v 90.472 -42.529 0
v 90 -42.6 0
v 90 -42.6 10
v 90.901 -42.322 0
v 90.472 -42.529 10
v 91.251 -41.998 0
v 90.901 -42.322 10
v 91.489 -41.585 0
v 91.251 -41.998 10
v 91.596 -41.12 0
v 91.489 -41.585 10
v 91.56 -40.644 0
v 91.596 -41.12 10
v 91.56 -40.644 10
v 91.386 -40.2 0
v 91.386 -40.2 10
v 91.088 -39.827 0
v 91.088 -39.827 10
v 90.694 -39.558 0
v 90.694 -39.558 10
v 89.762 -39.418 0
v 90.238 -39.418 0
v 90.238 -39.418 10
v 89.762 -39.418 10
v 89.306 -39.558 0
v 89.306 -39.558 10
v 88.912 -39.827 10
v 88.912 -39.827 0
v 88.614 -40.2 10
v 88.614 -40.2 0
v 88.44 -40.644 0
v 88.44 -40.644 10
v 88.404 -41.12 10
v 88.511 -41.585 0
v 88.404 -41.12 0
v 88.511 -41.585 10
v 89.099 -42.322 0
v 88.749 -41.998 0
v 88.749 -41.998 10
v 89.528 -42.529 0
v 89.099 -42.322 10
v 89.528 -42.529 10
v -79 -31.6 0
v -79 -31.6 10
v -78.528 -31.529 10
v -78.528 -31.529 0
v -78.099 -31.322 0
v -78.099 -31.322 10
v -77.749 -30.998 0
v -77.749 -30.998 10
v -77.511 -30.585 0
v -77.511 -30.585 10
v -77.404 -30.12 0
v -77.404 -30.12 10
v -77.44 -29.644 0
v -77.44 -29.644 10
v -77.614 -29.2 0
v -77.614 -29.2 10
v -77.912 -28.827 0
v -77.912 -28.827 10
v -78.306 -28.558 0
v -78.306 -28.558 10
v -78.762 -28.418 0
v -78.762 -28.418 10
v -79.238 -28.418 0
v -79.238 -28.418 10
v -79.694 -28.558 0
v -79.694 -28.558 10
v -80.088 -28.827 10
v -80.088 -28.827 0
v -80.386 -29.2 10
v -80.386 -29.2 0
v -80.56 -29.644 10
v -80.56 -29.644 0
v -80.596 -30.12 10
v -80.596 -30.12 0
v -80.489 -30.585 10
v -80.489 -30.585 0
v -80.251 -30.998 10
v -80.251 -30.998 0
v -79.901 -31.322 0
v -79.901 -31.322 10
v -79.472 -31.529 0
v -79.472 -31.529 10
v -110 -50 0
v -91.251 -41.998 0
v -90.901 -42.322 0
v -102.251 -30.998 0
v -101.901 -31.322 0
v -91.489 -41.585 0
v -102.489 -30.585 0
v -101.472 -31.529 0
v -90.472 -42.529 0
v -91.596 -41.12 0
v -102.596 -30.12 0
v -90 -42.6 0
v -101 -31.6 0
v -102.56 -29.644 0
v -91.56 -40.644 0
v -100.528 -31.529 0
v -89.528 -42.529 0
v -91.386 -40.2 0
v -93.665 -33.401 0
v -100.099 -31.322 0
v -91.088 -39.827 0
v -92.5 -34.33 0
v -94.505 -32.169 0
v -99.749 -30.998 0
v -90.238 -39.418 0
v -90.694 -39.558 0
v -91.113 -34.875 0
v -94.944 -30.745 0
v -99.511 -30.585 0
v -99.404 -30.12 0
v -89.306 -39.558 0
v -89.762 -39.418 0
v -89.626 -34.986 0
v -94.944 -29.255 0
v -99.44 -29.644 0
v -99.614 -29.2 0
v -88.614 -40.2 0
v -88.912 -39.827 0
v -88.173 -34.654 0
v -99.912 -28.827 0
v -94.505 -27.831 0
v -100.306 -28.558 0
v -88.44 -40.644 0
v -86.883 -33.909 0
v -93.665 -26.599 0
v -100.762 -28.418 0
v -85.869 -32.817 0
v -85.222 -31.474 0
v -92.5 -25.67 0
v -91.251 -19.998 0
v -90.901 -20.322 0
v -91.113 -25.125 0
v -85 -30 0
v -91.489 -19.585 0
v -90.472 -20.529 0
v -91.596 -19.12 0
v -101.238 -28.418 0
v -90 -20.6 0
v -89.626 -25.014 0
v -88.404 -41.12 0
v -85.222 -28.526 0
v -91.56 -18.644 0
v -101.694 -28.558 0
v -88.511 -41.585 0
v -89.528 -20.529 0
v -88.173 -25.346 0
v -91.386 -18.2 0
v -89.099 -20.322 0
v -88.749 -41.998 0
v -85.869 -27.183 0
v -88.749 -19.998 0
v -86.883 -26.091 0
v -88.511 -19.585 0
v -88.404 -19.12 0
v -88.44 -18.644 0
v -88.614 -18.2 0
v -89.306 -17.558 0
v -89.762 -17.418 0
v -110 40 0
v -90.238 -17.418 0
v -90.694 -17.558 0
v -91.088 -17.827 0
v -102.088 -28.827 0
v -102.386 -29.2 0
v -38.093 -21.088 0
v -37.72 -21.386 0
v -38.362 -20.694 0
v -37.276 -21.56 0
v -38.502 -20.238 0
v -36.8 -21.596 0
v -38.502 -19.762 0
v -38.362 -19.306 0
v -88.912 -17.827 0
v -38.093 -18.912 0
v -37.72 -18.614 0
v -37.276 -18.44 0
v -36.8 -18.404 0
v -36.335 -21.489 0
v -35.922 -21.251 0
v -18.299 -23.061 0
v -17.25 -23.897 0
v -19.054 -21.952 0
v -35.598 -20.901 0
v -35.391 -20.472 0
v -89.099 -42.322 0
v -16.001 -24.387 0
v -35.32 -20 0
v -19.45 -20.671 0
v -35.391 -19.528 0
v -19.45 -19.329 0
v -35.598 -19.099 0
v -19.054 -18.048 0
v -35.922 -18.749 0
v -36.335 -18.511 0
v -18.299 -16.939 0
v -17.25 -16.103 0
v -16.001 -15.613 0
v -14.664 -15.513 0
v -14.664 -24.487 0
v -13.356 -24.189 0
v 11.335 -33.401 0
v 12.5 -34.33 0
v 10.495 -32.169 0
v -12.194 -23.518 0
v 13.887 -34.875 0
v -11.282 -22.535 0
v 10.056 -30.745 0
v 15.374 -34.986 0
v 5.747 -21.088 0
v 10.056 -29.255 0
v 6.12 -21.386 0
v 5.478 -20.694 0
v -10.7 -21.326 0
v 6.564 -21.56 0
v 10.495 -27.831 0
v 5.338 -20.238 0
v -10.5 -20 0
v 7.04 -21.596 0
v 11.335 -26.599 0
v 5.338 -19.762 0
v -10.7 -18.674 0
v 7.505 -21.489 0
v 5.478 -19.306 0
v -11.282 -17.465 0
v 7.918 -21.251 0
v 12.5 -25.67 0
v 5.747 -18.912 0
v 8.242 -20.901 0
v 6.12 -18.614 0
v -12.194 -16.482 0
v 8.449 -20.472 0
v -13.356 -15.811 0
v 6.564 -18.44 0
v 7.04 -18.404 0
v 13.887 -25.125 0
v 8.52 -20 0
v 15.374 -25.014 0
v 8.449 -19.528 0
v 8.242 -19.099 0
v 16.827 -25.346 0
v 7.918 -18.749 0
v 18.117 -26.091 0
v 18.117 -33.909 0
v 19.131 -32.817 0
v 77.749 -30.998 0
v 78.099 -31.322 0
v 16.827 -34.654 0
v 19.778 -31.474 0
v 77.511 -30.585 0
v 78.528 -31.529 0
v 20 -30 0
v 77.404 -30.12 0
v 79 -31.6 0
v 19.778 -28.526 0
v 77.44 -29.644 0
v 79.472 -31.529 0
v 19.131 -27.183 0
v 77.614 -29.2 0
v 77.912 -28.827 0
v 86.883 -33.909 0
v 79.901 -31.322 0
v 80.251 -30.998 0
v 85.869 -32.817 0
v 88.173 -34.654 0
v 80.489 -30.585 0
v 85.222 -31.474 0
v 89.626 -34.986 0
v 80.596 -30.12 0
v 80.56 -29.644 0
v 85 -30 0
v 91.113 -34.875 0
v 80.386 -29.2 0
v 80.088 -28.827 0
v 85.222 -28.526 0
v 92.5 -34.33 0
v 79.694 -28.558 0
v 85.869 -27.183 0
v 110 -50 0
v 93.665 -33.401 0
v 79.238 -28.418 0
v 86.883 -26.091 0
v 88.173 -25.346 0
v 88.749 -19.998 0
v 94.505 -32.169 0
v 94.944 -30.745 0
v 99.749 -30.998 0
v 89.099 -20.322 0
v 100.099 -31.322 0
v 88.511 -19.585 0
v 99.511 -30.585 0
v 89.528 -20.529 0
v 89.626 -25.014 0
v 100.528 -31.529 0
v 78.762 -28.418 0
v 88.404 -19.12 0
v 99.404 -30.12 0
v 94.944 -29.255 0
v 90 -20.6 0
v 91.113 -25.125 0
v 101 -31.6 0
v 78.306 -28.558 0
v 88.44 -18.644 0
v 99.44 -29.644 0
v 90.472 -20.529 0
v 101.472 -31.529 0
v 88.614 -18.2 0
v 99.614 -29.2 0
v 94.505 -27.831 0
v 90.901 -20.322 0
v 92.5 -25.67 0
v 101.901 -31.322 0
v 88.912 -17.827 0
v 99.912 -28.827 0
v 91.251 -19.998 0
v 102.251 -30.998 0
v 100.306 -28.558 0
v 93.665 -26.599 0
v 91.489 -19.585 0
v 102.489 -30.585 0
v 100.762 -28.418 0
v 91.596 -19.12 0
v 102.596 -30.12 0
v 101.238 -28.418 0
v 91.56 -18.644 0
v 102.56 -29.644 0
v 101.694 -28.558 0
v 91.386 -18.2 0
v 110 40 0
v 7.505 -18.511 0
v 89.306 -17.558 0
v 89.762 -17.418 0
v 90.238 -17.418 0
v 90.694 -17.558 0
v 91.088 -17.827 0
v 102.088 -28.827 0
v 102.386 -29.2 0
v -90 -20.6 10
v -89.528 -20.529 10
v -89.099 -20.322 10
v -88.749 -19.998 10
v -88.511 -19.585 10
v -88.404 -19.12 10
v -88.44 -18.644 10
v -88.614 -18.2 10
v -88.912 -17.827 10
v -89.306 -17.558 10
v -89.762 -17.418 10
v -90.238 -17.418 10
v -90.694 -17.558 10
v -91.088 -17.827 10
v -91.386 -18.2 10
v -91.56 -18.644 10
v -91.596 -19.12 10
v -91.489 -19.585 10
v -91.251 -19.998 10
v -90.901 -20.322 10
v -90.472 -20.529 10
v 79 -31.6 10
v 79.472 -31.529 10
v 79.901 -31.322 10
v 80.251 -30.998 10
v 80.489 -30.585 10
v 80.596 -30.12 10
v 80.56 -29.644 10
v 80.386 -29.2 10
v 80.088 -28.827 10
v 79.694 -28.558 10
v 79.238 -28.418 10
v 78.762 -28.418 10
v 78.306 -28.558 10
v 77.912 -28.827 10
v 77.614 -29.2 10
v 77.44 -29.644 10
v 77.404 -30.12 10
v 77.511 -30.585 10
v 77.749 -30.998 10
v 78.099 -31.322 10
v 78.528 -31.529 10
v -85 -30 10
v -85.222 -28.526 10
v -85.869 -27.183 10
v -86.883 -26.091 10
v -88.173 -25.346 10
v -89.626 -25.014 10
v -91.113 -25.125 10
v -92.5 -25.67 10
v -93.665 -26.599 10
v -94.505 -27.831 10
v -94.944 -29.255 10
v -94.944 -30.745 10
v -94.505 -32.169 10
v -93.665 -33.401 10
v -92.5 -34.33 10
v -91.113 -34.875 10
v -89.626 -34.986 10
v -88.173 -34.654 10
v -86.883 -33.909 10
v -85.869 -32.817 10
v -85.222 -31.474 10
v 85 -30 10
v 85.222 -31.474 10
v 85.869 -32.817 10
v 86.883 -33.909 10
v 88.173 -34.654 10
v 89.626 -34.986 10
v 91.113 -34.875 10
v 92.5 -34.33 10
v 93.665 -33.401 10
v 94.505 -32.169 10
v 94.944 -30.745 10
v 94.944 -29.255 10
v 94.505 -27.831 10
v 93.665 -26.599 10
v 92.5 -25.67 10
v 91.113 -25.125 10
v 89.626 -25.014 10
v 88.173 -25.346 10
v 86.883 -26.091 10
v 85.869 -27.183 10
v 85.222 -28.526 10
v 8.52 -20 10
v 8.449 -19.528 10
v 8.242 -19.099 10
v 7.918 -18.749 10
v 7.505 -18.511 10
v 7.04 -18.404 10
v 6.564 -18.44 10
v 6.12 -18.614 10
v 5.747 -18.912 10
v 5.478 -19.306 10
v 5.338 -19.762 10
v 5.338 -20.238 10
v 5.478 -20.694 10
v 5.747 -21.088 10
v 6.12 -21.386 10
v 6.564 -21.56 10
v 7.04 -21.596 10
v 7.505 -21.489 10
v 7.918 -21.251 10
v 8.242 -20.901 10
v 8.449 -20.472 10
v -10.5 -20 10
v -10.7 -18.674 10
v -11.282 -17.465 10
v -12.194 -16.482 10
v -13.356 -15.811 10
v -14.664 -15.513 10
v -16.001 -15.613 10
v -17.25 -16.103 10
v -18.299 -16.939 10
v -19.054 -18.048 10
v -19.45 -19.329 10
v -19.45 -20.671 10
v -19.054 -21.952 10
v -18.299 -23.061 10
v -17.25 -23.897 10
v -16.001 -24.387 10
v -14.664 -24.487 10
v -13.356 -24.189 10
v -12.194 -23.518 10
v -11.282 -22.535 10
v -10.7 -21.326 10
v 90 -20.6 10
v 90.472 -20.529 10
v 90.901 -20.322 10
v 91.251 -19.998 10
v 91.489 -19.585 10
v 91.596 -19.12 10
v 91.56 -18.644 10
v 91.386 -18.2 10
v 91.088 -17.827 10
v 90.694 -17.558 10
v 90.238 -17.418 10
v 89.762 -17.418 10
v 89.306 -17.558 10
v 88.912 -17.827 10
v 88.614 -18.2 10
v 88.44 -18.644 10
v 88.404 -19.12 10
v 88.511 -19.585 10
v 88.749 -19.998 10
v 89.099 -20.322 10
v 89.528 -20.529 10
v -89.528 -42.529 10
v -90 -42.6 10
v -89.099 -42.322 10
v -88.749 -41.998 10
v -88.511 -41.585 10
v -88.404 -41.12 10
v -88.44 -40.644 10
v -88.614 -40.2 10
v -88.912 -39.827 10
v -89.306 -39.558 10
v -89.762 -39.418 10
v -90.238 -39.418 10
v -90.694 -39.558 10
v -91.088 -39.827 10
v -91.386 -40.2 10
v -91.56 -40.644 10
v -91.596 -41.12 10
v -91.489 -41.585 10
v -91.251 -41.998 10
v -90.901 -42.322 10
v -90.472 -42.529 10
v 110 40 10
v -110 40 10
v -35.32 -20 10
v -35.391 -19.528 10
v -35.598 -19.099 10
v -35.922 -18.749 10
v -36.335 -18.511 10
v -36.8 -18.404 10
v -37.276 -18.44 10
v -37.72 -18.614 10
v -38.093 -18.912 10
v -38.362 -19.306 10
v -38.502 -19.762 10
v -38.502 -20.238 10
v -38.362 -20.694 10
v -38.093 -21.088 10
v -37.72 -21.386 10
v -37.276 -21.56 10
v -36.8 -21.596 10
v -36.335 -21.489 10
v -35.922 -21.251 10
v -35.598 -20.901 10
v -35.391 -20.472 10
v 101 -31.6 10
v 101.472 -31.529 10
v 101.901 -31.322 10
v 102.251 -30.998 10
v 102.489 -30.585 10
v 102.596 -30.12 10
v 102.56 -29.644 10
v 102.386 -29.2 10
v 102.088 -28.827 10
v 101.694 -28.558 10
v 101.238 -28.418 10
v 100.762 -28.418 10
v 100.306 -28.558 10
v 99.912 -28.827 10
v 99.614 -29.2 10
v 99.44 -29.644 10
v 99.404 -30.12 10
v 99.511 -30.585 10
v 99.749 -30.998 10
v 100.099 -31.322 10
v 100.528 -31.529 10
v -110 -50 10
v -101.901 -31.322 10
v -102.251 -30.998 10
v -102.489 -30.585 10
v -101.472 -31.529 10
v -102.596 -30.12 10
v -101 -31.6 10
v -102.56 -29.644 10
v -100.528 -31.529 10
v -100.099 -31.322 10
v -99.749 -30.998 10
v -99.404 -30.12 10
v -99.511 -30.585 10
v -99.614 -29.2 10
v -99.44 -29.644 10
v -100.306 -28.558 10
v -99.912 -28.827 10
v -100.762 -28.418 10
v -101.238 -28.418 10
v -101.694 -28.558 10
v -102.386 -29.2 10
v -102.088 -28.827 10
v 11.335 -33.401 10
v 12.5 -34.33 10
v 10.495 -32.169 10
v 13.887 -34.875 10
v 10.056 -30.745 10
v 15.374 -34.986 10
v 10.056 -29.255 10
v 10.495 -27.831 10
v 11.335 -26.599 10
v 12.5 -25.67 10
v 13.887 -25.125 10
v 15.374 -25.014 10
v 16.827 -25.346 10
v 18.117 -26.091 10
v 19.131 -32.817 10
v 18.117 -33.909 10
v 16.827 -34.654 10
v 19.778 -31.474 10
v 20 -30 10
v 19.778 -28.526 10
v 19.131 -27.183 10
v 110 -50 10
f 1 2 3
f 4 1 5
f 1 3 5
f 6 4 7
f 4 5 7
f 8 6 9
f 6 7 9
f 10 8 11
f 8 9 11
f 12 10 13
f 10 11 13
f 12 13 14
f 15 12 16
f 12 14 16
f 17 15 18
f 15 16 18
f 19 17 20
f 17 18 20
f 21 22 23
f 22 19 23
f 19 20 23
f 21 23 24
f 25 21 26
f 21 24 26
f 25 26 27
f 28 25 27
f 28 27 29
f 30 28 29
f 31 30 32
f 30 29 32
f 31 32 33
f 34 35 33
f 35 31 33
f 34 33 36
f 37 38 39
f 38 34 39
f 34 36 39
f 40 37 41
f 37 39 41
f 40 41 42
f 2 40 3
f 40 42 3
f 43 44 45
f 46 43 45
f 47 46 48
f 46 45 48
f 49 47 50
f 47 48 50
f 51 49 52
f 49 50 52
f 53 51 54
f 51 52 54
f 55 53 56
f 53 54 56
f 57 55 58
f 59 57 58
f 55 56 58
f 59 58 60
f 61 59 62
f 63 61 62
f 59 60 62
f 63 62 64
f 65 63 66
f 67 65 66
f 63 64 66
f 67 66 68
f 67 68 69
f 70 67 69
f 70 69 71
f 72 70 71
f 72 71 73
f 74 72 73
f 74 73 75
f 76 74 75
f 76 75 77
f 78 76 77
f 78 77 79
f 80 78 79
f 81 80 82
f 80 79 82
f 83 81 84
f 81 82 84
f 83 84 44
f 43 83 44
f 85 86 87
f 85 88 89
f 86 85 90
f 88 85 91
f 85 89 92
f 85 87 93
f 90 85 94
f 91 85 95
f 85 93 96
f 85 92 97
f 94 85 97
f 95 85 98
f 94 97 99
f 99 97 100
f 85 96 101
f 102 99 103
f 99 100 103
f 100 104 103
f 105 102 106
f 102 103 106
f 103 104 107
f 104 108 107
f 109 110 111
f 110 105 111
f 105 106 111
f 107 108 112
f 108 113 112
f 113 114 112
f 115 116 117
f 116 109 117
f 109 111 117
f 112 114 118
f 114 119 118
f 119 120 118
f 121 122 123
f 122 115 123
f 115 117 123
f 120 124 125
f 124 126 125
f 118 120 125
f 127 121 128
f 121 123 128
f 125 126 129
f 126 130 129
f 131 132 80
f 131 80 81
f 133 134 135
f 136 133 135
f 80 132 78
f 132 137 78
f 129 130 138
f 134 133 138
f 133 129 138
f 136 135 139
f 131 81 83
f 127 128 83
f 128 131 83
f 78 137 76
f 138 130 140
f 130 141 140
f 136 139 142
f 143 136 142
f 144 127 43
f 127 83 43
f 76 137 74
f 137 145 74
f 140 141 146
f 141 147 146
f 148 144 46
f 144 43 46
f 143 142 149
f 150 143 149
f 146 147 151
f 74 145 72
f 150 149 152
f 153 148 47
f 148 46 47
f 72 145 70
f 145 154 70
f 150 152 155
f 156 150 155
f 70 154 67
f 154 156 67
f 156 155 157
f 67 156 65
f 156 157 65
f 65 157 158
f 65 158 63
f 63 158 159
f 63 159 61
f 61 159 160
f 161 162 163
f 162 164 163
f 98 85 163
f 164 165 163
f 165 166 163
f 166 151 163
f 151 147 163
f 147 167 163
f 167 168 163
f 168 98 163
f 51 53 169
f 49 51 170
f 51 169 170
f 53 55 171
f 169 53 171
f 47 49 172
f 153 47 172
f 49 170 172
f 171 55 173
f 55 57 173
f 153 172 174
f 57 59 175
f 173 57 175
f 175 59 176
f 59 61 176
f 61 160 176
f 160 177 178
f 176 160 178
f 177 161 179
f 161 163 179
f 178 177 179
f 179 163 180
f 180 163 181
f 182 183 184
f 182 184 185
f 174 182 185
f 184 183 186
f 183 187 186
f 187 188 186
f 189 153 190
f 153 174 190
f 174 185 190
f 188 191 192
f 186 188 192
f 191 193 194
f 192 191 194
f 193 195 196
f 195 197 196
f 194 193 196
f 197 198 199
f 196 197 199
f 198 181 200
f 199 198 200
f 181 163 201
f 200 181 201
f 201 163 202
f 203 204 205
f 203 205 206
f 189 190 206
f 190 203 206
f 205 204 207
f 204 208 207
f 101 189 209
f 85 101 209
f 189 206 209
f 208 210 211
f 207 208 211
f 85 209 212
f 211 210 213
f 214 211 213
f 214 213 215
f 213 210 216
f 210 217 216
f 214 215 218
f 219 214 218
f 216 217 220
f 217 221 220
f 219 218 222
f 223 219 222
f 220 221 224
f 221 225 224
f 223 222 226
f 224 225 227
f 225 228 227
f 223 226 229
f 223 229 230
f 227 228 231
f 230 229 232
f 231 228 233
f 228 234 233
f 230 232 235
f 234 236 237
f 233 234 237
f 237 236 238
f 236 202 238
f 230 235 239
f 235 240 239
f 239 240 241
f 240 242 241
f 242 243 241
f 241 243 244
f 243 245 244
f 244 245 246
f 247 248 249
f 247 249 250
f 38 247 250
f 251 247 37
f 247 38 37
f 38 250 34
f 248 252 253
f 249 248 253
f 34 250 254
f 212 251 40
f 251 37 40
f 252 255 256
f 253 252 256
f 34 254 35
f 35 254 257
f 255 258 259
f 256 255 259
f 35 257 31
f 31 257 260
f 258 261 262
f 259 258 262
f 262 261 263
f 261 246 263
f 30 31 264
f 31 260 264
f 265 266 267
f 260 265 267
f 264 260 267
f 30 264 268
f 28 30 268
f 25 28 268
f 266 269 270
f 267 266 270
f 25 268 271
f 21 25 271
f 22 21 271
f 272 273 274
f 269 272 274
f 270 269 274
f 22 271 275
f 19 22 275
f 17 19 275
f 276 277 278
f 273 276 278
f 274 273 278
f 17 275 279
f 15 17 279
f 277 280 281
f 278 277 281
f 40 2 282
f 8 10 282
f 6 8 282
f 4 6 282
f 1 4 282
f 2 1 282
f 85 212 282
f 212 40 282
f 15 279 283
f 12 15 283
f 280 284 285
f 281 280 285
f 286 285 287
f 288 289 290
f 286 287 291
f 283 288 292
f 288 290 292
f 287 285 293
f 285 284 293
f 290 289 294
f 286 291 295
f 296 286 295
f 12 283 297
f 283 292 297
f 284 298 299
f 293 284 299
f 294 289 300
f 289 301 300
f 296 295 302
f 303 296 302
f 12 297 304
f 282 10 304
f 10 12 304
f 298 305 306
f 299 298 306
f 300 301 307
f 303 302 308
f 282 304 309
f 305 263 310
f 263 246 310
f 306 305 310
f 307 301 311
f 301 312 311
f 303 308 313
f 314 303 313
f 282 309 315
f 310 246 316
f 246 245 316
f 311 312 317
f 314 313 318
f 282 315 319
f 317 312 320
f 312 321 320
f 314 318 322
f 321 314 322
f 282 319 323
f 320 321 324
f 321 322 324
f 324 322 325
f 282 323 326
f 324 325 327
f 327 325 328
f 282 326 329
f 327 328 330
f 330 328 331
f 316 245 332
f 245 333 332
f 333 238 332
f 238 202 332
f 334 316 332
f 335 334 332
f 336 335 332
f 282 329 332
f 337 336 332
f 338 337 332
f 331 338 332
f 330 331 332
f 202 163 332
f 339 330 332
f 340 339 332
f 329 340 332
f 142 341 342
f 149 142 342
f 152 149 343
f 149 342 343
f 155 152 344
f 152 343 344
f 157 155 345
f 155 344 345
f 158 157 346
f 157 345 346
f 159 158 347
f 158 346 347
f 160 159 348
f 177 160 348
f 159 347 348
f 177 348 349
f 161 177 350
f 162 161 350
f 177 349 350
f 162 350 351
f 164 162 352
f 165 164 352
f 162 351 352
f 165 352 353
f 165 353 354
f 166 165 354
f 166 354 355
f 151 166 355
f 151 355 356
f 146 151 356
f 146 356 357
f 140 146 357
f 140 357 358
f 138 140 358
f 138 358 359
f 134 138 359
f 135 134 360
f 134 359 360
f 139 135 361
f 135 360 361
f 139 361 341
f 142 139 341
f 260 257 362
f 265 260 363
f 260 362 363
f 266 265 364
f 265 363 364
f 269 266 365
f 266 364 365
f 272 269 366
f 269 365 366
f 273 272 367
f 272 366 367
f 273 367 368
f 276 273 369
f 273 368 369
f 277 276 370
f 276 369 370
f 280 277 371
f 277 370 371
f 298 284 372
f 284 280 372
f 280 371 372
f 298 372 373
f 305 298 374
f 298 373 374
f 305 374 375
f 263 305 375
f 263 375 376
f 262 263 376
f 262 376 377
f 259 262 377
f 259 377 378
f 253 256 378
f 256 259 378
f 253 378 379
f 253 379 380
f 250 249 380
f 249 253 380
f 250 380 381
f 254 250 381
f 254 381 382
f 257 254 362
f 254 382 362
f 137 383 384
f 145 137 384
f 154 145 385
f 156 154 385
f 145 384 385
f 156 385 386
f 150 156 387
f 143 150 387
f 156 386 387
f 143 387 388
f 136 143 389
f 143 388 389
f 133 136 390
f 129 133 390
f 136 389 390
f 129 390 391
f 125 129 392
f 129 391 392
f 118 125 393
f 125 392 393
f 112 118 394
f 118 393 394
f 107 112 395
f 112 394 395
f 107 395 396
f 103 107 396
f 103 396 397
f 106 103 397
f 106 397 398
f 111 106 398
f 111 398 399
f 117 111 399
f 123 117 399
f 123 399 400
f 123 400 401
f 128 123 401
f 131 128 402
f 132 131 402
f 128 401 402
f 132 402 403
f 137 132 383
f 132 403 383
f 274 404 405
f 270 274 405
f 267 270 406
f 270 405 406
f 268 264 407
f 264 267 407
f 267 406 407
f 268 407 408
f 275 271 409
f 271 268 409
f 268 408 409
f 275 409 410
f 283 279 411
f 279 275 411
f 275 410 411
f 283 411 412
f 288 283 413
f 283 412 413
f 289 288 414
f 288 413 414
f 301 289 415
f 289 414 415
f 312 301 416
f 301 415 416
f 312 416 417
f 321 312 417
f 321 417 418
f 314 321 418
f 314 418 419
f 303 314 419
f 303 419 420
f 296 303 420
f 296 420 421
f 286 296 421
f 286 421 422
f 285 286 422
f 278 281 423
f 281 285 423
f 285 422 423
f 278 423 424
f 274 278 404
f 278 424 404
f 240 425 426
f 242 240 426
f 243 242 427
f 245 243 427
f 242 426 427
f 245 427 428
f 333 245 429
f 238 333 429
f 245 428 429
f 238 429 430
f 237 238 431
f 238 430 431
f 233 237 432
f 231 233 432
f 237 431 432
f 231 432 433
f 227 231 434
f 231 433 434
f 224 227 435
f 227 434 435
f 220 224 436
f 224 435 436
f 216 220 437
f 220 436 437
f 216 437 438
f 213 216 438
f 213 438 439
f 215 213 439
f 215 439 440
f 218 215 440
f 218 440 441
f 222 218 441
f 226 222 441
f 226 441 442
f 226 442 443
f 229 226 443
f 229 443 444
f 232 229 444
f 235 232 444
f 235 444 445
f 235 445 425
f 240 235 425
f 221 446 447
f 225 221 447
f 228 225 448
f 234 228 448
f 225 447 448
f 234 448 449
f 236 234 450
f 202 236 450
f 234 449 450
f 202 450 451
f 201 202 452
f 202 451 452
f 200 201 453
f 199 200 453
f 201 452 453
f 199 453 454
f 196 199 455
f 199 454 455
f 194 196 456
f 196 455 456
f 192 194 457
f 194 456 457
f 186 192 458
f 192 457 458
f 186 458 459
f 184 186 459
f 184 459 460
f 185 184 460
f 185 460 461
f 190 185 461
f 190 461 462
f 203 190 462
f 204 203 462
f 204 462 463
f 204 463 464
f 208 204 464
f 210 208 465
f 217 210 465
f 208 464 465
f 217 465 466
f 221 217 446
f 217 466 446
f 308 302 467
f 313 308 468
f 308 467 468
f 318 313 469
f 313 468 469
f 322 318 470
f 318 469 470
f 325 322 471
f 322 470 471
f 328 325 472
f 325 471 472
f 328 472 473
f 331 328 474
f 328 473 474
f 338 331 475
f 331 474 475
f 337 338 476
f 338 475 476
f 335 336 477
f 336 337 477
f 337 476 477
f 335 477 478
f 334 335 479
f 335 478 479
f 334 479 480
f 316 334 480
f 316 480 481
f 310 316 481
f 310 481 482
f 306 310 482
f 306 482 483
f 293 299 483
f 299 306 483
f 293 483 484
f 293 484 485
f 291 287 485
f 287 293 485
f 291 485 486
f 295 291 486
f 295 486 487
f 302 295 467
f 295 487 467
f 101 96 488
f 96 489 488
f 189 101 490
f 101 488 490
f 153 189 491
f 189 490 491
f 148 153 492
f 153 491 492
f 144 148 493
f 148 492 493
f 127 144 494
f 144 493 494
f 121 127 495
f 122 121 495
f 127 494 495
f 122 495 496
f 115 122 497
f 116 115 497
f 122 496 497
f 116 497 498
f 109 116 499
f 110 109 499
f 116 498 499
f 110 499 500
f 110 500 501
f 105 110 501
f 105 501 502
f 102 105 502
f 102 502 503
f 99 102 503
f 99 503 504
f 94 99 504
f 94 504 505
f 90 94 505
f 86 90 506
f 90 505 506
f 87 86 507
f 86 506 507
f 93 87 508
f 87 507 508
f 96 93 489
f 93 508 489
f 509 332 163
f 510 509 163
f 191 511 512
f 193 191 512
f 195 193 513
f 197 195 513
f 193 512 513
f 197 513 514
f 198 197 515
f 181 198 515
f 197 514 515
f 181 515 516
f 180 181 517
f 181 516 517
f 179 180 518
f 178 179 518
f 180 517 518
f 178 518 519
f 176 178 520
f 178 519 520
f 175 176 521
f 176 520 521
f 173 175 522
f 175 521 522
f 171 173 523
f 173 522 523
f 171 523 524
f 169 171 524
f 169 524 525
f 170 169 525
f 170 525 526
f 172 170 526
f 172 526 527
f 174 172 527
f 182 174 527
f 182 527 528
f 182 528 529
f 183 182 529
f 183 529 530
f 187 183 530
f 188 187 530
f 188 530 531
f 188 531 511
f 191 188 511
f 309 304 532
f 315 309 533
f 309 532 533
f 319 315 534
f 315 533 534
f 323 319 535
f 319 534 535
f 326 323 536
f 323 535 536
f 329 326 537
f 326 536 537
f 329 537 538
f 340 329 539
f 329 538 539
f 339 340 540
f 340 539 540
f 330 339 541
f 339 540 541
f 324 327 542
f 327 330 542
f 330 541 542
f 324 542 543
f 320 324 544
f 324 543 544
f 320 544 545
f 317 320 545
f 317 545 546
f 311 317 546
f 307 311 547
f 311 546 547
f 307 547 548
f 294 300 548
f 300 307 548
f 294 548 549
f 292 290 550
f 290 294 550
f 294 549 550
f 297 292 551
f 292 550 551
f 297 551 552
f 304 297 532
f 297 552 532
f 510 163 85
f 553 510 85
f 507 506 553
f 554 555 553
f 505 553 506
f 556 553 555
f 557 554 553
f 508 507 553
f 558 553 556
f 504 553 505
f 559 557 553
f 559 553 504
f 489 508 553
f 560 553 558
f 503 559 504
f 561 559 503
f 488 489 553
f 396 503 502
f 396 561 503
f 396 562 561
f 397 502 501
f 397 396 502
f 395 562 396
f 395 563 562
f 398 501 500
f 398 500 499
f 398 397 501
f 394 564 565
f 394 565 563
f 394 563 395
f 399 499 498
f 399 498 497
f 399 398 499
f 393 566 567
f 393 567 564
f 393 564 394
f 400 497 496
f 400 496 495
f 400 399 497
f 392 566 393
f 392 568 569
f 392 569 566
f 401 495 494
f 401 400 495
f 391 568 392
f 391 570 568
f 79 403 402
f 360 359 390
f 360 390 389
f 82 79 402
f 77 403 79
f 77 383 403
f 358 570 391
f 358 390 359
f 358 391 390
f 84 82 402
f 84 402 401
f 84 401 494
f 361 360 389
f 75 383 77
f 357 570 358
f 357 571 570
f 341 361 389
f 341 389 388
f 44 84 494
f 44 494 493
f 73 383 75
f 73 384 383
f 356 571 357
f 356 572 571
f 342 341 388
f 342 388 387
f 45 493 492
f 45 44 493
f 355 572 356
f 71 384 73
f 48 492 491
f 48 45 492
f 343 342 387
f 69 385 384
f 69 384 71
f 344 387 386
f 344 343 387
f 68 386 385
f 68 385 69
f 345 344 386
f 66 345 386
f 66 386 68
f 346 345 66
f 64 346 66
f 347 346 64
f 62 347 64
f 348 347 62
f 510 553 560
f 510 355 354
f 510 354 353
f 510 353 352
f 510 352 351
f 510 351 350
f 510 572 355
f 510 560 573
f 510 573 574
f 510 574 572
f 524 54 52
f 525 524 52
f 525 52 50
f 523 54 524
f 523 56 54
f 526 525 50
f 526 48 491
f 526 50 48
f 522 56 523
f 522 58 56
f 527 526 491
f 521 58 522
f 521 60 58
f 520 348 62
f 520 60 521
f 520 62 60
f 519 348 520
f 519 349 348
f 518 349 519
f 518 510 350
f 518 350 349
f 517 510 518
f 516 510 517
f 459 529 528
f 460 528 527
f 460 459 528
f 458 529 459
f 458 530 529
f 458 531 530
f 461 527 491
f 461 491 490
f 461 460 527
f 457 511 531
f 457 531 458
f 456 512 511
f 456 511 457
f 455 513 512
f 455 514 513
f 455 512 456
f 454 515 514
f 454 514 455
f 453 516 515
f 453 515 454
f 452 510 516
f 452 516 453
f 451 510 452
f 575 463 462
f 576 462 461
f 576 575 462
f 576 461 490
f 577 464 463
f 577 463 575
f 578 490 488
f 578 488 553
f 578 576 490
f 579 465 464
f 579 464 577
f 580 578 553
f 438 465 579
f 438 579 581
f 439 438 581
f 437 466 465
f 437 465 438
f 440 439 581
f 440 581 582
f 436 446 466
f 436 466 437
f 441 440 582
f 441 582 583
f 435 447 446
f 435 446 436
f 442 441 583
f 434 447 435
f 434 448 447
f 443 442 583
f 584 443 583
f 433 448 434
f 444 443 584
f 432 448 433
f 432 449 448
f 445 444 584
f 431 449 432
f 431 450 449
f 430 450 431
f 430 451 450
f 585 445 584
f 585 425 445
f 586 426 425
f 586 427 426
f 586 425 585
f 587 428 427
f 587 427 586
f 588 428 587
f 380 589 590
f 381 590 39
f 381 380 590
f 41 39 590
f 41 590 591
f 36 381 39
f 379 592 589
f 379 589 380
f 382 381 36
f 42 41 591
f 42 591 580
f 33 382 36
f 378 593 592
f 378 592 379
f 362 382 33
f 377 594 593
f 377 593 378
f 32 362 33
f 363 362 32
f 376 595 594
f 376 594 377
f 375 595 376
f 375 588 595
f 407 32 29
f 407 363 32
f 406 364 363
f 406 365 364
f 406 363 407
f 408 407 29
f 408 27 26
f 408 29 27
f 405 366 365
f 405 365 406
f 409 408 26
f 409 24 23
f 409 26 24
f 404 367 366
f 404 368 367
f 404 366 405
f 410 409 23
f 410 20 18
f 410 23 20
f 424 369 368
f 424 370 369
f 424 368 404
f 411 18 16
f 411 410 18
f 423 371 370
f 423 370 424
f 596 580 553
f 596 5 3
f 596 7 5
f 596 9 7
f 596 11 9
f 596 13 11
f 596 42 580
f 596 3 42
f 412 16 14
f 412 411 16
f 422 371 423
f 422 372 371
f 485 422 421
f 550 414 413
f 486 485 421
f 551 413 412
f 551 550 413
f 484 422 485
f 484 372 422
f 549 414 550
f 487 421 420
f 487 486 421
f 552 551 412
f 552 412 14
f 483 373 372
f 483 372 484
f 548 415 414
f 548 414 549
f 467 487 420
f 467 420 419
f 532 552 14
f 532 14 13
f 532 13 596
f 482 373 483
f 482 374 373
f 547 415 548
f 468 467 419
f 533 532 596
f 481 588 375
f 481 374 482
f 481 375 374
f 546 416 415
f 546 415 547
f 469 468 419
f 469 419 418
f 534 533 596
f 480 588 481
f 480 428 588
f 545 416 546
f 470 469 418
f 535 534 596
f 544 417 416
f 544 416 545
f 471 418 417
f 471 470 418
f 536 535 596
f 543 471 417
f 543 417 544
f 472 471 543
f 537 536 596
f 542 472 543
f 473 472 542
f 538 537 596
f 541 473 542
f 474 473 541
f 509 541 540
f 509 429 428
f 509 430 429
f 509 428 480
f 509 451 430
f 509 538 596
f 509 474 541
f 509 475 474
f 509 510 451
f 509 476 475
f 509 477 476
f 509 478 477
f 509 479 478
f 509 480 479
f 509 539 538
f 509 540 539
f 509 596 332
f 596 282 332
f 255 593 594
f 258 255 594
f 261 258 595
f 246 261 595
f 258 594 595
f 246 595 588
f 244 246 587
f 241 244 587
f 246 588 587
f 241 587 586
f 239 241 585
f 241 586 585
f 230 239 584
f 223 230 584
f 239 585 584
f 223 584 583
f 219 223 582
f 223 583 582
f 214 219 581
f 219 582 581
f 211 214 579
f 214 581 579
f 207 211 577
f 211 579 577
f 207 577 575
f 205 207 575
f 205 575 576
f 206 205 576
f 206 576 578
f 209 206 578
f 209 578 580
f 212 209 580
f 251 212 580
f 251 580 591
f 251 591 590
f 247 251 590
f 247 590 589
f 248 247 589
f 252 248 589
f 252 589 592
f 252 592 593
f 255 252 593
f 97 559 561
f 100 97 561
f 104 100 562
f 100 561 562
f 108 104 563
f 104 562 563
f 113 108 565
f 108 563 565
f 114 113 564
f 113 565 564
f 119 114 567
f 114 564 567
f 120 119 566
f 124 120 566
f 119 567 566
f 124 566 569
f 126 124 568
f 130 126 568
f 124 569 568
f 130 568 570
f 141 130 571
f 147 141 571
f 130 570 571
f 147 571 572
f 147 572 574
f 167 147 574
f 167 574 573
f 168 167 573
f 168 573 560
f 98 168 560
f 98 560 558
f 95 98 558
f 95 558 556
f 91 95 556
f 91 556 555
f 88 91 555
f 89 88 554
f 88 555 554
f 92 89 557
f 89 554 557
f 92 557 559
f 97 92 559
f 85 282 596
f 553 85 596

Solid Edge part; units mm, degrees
sketch "Sketch1" plane through (0, 0, 0) normal (0, 0, 1) x (1, 0, 0)
  line L0 (-110, -40) -> (110, -40)
  line L1 (110, -40) -> (110, 40)
  line L2 (110, 40) -> (-110, 40)
  line L3 (-110, 40) -> (-110, -40)
  dimension "D1" = 220
  dimension "D2" = 80
extrude "Protrusion1" add sketch "Sketch1" along normal blind 10
sketch "Sketch2" plane through (0, 0, 10) normal (0, 0, 1) x (1, 0, 0)
  circle A0 centre (15, -30) radius 5
  dimension "D1" = 75
  dimension "D2" = 10
extrude "Cutout1" cut sketch "Sketch2" against normal through all
sketch "Sketch3" plane through (0, 0, 10) normal (0, 0, 1) x (1, 0, 0)
  circle A0 centre (-15, -20) radius 4.5
  circle A1 centre (-36.92, -20) radius 1.6
  circle A2 centre (6.92, -20) radius 1.6
  dimension "D1" = 30
  dimension "D2" = 10
  dimension "D3" = 9
  dimension "D4" = 43.84
  dimension "D5" = 3.2
  dimension "D6" = 3.2
extrude "Cutout2" cut sketch "Sketch3" against normal up to next
sketch "Sketch4" plane through (0, -40, 5) normal (0, -1, 0) x (1, 0, 0)
  line L0 (-110, 5) -> (110, 5)
  line L1 (110, 5) -> (110, -5)
  line L2 (110, -5) -> (-110, -5)
  line L3 (-110, -5) -> (-110, 5)
extrude "Extrusionsausprägung_2" add sketch "Sketch4" along normal blind 10
sketch "Sketch5" plane through (0, -5, 10) normal (0, 0, 1) x (1, 0, 0)
  circle A0 centre (-90, -25) radius 5
  dimension "D1" = 90
  dimension "D2" = 20
  dimension "D3" = 10
extrude "Cutout3" cut sketch "Sketch5" against normal up to next
hole "Bohrung_1" at (-90, -41, 10) direction (0, 0, -1) diameter 3.2 end up to next
hole "Hole1" at (-101, -30, 10) direction (0, 0, -1) diameter 3.2 end up to next
hole "Hole2" at (-79, -30, 10) direction (0, 0, -1) diameter 3.2 end up to next
hole "Hole3" at (-90, -19, 10) direction (0, 0, -1) diameter 3.2 end up to next
mirror "Mirror1" about plane through (0, 0, 0) normal (1, 0, 0) of "Cutout3", "Bohrung_1", "Hole1", "Hole2", "Hole3"
properties material "Nylon, allgemein"
